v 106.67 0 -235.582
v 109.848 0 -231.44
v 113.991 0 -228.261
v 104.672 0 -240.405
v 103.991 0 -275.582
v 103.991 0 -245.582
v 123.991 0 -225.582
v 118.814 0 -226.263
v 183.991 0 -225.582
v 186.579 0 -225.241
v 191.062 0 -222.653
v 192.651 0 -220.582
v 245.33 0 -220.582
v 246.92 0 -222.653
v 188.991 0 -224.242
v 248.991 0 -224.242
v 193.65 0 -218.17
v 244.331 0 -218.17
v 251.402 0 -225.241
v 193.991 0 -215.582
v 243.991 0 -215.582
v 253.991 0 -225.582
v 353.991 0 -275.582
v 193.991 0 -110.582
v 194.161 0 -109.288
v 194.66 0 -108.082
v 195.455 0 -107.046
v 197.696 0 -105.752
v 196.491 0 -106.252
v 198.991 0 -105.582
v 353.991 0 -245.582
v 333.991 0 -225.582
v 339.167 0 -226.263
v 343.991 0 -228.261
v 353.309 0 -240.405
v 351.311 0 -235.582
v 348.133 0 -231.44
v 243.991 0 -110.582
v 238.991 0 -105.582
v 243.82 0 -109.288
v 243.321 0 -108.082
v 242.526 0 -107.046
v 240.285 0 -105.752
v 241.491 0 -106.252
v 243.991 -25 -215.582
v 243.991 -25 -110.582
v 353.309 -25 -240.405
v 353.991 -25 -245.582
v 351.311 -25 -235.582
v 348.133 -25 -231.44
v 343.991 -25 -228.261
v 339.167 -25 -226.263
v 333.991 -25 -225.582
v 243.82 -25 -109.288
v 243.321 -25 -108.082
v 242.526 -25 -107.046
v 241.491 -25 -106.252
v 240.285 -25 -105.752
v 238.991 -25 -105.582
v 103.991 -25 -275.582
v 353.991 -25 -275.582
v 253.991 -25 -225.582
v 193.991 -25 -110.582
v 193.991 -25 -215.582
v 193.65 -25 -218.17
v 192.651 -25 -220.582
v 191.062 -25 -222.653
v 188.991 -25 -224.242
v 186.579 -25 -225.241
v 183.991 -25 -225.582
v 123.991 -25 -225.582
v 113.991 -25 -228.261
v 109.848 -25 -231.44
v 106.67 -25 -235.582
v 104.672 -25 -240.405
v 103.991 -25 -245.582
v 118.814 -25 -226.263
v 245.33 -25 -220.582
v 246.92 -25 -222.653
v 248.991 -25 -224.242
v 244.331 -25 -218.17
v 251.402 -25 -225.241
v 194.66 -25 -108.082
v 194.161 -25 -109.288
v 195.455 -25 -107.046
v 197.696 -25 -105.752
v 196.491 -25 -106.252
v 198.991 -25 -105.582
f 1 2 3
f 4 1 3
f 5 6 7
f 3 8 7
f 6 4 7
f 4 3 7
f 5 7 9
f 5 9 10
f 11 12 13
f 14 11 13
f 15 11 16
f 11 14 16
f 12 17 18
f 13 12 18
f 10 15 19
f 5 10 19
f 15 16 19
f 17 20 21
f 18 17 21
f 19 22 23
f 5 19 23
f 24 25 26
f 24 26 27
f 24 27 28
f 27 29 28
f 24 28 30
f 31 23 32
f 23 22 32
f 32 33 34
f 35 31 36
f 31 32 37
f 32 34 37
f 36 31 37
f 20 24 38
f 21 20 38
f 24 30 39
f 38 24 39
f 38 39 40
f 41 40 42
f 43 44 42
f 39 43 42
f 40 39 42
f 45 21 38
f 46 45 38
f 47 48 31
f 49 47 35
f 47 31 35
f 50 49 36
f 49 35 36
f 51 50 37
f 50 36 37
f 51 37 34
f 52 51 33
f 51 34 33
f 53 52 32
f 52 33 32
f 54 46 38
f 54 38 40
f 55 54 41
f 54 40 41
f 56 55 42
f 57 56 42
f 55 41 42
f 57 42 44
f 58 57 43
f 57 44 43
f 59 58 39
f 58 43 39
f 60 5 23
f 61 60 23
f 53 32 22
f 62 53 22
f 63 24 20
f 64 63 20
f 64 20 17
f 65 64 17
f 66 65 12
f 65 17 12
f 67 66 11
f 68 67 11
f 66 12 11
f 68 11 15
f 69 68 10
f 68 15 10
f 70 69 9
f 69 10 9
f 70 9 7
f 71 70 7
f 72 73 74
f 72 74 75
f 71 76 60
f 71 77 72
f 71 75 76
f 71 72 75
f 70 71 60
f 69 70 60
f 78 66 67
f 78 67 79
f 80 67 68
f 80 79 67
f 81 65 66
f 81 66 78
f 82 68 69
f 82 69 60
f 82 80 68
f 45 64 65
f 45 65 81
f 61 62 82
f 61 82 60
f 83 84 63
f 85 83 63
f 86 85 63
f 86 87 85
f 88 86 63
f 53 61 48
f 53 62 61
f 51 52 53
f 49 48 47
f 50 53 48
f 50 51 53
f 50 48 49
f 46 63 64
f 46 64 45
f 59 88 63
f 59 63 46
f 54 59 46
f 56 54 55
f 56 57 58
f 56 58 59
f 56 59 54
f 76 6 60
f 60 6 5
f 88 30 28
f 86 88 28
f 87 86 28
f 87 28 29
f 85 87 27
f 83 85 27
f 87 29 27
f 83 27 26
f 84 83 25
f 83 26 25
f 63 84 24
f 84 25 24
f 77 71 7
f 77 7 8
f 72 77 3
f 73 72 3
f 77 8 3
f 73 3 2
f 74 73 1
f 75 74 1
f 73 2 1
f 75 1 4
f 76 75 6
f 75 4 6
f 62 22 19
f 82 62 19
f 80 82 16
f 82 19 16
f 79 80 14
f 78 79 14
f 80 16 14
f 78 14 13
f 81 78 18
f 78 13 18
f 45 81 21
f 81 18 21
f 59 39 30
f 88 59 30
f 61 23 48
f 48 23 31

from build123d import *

# Parameters (mm, degrees)
F1_DEPTH = 25


with BuildPart() as f1:
    # F0 (on Front) → F1 (new body)
    with BuildSketch(Plane.XZ):
        with BuildLine():
            Line((103.990591, -245.581819), (103.990591, -275.581819))
            Line((103.990591, -275.581819), (353.990591, -275.581819))
            Line((353.990591, -275.581819), (353.990591, -245.581819))
            ThreePointArc((353.990591, -245.581819), (348.132727, -231.439684), (333.990591, -225.581819))
            Line((333.990591, -225.581819), (253.990591, -225.581819))
            ThreePointArc((253.990591, -225.581819), (246.919523, -222.652887), (243.990591, -215.581819))
            Line((243.990591, -215.581819), (243.990591, -110.581819))
            ThreePointArc((243.990591, -110.581819), (242.526125, -107.046285), (238.990591, -105.581819))
            Line((238.990591, -105.581819), (198.990591, -105.581819))
            ThreePointArc((198.990591, -105.581819), (195.455057, -107.046285), (193.990591, -110.581819))
            Line((193.990591, -110.581819), (193.990591, -215.581819))
            ThreePointArc((193.990591, -215.581819), (191.061659, -222.652887), (183.990591, -225.581819))
            Line((183.990591, -225.581819), (123.990591, -225.581819))
            ThreePointArc((123.990591, -225.581819), (109.848456, -231.439684), (103.990591, -245.581819))
        make_face()
    extrude(amount=F1_DEPTH)


solid = f1.part
